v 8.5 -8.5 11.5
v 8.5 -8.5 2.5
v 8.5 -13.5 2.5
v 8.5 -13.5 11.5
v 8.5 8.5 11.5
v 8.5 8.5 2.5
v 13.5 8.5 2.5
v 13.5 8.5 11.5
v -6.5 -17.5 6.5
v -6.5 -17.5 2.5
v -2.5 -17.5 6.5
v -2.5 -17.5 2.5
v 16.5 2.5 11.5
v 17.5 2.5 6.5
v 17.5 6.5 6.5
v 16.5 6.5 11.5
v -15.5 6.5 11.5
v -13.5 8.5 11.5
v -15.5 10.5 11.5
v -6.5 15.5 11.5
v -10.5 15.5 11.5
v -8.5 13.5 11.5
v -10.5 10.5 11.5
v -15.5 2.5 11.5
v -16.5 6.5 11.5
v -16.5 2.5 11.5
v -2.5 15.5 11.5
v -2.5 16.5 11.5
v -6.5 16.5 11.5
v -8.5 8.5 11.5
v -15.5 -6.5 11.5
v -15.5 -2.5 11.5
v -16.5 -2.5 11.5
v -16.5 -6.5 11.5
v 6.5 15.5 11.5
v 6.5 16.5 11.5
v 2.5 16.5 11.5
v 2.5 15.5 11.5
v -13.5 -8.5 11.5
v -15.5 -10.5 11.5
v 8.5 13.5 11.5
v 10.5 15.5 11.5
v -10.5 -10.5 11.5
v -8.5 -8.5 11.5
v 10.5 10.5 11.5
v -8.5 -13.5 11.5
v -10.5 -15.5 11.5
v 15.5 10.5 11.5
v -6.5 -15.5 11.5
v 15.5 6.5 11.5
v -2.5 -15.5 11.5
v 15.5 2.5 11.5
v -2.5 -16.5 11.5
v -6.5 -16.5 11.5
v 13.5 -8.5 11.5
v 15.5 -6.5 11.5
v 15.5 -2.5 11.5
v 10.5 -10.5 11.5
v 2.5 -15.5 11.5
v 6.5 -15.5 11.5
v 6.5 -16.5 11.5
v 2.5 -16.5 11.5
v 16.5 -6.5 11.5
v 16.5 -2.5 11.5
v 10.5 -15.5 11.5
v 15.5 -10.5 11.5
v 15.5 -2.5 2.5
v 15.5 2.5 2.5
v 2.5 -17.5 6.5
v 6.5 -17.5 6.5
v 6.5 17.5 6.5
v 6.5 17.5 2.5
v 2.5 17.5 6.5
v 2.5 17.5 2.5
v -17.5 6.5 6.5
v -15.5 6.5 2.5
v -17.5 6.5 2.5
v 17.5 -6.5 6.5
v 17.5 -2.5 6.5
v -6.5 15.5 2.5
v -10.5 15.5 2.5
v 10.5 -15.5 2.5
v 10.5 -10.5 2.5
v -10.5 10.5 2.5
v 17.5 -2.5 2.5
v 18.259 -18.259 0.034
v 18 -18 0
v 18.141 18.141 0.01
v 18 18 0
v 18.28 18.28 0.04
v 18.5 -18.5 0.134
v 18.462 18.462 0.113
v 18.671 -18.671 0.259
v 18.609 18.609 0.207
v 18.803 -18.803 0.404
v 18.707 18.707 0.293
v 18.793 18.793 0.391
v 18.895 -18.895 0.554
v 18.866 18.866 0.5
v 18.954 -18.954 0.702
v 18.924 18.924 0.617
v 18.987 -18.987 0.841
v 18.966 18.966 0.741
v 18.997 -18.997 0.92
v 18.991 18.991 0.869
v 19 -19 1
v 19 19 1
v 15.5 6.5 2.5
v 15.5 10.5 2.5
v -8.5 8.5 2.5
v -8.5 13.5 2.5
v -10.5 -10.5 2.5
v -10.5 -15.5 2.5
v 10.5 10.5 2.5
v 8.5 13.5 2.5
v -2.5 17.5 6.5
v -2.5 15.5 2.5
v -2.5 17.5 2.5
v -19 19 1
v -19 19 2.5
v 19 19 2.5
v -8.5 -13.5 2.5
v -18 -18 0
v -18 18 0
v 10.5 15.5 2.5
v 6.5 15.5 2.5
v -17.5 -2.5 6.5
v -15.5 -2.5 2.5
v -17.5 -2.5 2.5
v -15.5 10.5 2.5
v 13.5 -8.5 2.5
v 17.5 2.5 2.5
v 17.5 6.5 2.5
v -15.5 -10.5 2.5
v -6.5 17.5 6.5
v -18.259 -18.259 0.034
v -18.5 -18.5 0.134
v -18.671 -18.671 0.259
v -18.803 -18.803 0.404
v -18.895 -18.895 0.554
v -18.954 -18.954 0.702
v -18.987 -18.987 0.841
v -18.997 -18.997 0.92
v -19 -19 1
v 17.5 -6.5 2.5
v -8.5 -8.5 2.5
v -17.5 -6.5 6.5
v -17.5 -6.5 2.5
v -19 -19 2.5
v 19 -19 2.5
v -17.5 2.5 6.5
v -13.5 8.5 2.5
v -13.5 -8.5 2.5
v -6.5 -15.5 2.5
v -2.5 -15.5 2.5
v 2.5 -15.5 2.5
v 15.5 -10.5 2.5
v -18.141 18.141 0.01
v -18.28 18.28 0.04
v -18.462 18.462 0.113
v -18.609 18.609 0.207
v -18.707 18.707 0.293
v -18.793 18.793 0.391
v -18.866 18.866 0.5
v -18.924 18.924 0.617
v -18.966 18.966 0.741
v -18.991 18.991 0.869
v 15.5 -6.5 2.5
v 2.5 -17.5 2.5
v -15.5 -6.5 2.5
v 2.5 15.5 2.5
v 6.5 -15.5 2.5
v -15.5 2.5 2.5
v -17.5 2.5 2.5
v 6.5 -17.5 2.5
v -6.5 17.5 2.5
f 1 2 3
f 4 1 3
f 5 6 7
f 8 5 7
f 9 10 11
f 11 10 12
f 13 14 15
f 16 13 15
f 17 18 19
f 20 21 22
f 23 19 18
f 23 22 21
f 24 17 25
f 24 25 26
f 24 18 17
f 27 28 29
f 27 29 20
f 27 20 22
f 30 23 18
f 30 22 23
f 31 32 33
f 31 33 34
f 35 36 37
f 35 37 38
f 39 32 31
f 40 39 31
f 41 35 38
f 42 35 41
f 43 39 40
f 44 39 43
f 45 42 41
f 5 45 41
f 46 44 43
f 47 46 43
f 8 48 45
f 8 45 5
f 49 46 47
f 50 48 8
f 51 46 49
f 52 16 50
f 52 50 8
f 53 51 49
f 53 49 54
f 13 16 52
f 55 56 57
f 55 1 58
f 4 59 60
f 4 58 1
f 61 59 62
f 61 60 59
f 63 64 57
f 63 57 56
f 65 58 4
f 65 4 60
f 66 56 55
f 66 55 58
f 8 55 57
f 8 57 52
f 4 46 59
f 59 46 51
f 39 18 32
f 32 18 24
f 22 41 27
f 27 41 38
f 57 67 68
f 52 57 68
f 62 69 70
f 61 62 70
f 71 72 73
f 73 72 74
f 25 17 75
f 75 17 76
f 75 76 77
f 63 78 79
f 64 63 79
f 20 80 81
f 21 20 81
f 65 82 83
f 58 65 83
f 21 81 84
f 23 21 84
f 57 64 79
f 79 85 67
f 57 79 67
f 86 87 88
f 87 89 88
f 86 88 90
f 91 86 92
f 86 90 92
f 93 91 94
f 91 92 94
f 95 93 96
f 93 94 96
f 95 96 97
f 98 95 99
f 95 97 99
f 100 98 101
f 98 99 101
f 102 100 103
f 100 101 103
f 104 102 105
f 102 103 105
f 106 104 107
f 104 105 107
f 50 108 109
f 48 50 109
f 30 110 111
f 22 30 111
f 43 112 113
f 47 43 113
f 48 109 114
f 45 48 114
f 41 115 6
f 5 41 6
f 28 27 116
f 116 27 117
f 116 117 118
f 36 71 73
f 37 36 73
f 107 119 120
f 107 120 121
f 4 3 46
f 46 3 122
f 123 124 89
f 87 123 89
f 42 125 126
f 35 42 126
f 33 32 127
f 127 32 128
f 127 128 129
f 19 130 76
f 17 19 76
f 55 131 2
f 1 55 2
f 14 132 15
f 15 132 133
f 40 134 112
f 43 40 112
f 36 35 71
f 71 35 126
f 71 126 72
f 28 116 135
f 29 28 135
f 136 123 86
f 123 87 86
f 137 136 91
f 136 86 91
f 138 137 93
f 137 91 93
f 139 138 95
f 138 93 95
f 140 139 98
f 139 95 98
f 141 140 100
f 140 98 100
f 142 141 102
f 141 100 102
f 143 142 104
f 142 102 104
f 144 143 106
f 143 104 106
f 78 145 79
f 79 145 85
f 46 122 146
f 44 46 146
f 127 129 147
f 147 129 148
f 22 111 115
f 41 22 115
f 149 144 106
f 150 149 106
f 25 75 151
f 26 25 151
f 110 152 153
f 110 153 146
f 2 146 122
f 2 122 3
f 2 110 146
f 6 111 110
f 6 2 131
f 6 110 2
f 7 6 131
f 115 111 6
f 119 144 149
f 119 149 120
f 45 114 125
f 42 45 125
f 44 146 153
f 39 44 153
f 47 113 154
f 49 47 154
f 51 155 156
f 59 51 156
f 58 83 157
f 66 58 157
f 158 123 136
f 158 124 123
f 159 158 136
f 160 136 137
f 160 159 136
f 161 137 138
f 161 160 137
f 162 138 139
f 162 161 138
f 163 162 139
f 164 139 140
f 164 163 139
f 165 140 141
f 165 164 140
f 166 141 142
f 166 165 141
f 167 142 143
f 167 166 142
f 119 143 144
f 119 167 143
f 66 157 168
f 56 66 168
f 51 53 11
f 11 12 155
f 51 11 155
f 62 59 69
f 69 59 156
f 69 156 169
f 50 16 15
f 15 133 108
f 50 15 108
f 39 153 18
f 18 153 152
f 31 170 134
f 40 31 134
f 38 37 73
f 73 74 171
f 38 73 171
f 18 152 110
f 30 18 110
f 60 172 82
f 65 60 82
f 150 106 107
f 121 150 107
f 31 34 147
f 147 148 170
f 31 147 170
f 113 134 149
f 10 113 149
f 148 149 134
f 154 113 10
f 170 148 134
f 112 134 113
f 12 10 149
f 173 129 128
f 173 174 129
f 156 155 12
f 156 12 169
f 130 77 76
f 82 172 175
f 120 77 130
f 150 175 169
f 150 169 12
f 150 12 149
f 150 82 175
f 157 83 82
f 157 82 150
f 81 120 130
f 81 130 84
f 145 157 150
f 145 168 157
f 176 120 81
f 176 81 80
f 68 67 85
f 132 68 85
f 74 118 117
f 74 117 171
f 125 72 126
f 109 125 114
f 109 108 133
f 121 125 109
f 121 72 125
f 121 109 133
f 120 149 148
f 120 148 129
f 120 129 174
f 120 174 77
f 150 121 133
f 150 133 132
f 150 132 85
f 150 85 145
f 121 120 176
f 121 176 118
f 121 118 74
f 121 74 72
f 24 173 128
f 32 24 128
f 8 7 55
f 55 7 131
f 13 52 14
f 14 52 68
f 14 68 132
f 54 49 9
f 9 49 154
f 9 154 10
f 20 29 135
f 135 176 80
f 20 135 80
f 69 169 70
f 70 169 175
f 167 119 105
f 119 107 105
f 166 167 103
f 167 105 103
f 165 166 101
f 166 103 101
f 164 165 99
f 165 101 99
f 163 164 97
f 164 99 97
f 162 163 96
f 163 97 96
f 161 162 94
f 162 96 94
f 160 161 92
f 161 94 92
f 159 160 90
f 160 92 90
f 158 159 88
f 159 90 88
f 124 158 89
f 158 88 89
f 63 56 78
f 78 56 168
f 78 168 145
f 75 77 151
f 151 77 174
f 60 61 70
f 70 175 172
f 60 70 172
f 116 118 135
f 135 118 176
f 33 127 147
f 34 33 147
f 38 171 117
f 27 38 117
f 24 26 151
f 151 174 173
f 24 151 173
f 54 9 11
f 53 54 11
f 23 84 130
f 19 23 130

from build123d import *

# Parameters (mm, degrees)
F0_W     = 38
F0_H     = 38
F1_DEPTH = 2.5
F3_DEPTH = 9
F4_SIZE2 = 5
F4_SIZE  = 1
F6_COUNT = 4
F7_R     = 1


with BuildPart() as f1:
    # F0 (on Top) → F1 (new body)
    with BuildSketch(Plane.XY):
        Rectangle(F0_W, F0_H)
    extrude(amount=F1_DEPTH)



with BuildPart() as f3:
    # F2 (on face) → F3 (new body)
    with BuildSketch(Plane.XY.offset(2.5)):
        Polygon((-15.5, 0), (-13.5, 0), (-13.5, 8.5), (-8.5, 8.5), (-8.5, 13.5), (0, 13.5), (0, 15.5), (-2.5, 15.5), (-2.5, 17.5), (-6.5, 17.5), (-6.5, 15.5), (-10.5, 15.5), (-10.5, 10.5), (-15.5, 10.5), (-15.5, 6.5), (-17.5, 6.5), (-17.5, 2.5), (-15.5, 2.5), align=None)
    extrude(amount=F3_DEPTH)

    # F4
    f4_edges = [f3.edges().sort_by_distance(p)[0] for p in [
        (-17.5, 4.5, 11.5),
        (-4.5, 17.5, 11.5),
    ]]
    f4_side = f3.faces().sort_by_distance((-10.131757, 10.131757, 11.5))[0]
    chamfer(f4_edges, length=F4_SIZE, length2=F4_SIZE2, reference=f4_side)


with BuildPart() as f1_1:
    add(f1.part)

    add(f3.part)  # F6 merges F3
    # F6: F3 ×4 about axis
    f6_axis = Axis((0, 0, 21.3143786676), (0, 0, 1))
    for i in range(1, F6_COUNT):
        add(f3.part.rotate(f6_axis, i * 360 / F6_COUNT))

    # F7
    f7_edges = [f1_1.edges().sort_by_distance(p)[0] for p in [
        (0, 19, 0),
        (-19, 0, 0),
        (0, -19, 0),
        (19, 0, 0),
    ]]
    fillet(f7_edges, radius=F7_R)


solid = f1_1.part
